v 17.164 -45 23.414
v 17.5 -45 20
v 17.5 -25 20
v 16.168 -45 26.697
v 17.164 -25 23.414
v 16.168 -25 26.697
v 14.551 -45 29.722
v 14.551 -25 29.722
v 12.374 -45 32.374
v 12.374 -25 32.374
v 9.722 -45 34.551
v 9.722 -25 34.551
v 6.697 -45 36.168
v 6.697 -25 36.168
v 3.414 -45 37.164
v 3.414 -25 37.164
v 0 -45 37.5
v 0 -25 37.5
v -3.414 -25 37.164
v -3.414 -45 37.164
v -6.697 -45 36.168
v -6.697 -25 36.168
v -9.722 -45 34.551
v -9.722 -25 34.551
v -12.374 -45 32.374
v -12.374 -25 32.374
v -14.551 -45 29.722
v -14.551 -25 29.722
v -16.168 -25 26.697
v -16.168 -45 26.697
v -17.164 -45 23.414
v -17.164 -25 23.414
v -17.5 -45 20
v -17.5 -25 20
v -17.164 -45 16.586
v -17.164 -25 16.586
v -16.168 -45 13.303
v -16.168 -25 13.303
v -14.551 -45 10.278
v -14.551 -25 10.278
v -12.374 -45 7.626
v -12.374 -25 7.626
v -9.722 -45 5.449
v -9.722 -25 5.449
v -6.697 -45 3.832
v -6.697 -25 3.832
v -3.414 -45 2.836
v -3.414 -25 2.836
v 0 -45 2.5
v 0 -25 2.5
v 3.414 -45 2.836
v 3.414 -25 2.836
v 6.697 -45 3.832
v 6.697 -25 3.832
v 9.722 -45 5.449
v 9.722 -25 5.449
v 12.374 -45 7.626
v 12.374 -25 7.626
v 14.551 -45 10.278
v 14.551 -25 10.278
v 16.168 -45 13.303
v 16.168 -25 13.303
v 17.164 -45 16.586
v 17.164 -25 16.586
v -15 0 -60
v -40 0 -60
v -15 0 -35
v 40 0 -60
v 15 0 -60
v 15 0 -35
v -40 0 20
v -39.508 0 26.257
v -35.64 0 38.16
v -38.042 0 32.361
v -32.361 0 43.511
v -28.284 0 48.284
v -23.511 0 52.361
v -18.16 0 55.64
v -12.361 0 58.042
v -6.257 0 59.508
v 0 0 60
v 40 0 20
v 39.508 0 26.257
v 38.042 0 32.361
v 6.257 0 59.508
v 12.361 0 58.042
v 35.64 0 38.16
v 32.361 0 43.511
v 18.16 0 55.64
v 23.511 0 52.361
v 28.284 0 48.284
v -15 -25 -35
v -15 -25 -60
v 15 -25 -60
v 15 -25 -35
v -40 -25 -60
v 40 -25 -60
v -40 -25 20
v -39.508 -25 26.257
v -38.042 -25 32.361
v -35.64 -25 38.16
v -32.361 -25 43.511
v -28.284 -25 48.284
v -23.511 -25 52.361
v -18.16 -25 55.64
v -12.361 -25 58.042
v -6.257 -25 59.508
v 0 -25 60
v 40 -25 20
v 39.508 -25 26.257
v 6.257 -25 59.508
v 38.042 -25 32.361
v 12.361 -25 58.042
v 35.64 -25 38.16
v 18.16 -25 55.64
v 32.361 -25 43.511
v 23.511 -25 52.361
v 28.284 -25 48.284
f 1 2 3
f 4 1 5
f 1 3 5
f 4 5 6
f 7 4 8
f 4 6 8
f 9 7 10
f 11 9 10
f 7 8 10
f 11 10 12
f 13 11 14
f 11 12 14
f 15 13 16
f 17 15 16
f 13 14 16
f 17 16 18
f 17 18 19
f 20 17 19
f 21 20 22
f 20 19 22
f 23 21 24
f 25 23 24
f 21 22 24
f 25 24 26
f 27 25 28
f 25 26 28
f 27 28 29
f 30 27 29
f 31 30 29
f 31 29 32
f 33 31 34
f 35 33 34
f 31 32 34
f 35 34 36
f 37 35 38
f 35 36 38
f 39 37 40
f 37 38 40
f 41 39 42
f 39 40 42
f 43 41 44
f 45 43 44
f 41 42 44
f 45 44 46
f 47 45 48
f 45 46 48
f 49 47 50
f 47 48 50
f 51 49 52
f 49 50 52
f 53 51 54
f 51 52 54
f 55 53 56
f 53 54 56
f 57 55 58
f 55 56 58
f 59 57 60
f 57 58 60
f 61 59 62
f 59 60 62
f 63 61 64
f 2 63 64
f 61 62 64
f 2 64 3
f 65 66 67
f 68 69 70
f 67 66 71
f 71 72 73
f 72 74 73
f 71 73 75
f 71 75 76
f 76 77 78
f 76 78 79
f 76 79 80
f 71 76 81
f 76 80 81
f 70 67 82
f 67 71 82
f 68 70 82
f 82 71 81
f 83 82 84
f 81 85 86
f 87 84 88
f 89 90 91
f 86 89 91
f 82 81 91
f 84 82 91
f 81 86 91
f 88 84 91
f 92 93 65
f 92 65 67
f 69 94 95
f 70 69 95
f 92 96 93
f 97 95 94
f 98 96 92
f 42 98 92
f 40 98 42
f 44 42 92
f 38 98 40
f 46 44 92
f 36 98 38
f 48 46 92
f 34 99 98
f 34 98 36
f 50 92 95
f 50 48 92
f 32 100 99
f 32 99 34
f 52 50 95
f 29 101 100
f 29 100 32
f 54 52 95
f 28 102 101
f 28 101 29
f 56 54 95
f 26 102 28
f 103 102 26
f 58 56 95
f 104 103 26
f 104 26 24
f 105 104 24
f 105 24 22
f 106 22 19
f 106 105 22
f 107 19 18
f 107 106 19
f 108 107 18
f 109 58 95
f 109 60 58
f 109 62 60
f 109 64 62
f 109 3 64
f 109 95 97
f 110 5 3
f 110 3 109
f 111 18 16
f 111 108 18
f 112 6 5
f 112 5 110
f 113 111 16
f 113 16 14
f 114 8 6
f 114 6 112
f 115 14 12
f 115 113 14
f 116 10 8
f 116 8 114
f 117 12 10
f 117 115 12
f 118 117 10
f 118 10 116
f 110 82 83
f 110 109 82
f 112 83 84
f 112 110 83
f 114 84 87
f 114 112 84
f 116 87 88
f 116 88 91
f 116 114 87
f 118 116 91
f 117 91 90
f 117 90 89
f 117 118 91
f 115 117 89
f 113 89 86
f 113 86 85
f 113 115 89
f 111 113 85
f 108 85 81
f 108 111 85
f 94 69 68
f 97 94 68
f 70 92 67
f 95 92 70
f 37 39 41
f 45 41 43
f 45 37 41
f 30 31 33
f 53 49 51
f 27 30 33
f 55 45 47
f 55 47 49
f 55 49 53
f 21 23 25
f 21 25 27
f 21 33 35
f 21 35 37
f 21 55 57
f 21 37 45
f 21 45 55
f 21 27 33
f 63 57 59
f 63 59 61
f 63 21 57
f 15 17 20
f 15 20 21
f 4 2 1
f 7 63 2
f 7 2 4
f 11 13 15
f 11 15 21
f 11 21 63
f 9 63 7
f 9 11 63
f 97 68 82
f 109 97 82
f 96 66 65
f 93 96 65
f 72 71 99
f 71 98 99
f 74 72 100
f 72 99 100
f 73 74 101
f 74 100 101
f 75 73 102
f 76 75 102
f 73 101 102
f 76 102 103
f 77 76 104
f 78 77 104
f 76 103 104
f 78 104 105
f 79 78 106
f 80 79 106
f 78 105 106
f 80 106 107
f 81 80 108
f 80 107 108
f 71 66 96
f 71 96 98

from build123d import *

# Parameters (mm, degrees)
F0_W     = 80
F0_H     = 120
F1_DEPTH = 25
F2_R     = 39.99999
F3_W     = 30
F3_H     = 50
F4_DEPTH = 25.001
F5_R     = 17.5
F6_DEPTH = 20


# Not quite as in the source:
# - a fillet or chamfer is up to 0.001 mm smaller than in the source, because OpenCascade refuses the exact size


with BuildPart() as f1:
    # F0 (on Front) → F1 (new body)
    with BuildSketch(Plane.XZ):
        Rectangle(F0_W, F0_H)
    extrude(amount=F1_DEPTH)

    # F2 (radius 40 in the source; OpenCascade refuses exactly that, so slightly less here)
    f2_edges = [f1.edges().sort_by_distance(p)[0] for p in [
        (40, -12.5, 60),
        (-40, -12.5, 60),
    ]]
    fillet(f2_edges, radius=F2_R)

    # F3 (on face) → F4 (cut, through all)
    with BuildSketch(Plane.XZ.offset(25)):
        with Locations((0, -60)):
            Rectangle(F3_W, F3_H)
    extrude(amount=-F4_DEPTH, mode=Mode.SUBTRACT)

    # F5 (on face) → F6 (join)
    with BuildSketch(Plane.XZ.offset(25)):
        with Locations((0, 20)):
            Circle(F5_R)
    extrude(amount=F6_DEPTH)


solid = f1.part
